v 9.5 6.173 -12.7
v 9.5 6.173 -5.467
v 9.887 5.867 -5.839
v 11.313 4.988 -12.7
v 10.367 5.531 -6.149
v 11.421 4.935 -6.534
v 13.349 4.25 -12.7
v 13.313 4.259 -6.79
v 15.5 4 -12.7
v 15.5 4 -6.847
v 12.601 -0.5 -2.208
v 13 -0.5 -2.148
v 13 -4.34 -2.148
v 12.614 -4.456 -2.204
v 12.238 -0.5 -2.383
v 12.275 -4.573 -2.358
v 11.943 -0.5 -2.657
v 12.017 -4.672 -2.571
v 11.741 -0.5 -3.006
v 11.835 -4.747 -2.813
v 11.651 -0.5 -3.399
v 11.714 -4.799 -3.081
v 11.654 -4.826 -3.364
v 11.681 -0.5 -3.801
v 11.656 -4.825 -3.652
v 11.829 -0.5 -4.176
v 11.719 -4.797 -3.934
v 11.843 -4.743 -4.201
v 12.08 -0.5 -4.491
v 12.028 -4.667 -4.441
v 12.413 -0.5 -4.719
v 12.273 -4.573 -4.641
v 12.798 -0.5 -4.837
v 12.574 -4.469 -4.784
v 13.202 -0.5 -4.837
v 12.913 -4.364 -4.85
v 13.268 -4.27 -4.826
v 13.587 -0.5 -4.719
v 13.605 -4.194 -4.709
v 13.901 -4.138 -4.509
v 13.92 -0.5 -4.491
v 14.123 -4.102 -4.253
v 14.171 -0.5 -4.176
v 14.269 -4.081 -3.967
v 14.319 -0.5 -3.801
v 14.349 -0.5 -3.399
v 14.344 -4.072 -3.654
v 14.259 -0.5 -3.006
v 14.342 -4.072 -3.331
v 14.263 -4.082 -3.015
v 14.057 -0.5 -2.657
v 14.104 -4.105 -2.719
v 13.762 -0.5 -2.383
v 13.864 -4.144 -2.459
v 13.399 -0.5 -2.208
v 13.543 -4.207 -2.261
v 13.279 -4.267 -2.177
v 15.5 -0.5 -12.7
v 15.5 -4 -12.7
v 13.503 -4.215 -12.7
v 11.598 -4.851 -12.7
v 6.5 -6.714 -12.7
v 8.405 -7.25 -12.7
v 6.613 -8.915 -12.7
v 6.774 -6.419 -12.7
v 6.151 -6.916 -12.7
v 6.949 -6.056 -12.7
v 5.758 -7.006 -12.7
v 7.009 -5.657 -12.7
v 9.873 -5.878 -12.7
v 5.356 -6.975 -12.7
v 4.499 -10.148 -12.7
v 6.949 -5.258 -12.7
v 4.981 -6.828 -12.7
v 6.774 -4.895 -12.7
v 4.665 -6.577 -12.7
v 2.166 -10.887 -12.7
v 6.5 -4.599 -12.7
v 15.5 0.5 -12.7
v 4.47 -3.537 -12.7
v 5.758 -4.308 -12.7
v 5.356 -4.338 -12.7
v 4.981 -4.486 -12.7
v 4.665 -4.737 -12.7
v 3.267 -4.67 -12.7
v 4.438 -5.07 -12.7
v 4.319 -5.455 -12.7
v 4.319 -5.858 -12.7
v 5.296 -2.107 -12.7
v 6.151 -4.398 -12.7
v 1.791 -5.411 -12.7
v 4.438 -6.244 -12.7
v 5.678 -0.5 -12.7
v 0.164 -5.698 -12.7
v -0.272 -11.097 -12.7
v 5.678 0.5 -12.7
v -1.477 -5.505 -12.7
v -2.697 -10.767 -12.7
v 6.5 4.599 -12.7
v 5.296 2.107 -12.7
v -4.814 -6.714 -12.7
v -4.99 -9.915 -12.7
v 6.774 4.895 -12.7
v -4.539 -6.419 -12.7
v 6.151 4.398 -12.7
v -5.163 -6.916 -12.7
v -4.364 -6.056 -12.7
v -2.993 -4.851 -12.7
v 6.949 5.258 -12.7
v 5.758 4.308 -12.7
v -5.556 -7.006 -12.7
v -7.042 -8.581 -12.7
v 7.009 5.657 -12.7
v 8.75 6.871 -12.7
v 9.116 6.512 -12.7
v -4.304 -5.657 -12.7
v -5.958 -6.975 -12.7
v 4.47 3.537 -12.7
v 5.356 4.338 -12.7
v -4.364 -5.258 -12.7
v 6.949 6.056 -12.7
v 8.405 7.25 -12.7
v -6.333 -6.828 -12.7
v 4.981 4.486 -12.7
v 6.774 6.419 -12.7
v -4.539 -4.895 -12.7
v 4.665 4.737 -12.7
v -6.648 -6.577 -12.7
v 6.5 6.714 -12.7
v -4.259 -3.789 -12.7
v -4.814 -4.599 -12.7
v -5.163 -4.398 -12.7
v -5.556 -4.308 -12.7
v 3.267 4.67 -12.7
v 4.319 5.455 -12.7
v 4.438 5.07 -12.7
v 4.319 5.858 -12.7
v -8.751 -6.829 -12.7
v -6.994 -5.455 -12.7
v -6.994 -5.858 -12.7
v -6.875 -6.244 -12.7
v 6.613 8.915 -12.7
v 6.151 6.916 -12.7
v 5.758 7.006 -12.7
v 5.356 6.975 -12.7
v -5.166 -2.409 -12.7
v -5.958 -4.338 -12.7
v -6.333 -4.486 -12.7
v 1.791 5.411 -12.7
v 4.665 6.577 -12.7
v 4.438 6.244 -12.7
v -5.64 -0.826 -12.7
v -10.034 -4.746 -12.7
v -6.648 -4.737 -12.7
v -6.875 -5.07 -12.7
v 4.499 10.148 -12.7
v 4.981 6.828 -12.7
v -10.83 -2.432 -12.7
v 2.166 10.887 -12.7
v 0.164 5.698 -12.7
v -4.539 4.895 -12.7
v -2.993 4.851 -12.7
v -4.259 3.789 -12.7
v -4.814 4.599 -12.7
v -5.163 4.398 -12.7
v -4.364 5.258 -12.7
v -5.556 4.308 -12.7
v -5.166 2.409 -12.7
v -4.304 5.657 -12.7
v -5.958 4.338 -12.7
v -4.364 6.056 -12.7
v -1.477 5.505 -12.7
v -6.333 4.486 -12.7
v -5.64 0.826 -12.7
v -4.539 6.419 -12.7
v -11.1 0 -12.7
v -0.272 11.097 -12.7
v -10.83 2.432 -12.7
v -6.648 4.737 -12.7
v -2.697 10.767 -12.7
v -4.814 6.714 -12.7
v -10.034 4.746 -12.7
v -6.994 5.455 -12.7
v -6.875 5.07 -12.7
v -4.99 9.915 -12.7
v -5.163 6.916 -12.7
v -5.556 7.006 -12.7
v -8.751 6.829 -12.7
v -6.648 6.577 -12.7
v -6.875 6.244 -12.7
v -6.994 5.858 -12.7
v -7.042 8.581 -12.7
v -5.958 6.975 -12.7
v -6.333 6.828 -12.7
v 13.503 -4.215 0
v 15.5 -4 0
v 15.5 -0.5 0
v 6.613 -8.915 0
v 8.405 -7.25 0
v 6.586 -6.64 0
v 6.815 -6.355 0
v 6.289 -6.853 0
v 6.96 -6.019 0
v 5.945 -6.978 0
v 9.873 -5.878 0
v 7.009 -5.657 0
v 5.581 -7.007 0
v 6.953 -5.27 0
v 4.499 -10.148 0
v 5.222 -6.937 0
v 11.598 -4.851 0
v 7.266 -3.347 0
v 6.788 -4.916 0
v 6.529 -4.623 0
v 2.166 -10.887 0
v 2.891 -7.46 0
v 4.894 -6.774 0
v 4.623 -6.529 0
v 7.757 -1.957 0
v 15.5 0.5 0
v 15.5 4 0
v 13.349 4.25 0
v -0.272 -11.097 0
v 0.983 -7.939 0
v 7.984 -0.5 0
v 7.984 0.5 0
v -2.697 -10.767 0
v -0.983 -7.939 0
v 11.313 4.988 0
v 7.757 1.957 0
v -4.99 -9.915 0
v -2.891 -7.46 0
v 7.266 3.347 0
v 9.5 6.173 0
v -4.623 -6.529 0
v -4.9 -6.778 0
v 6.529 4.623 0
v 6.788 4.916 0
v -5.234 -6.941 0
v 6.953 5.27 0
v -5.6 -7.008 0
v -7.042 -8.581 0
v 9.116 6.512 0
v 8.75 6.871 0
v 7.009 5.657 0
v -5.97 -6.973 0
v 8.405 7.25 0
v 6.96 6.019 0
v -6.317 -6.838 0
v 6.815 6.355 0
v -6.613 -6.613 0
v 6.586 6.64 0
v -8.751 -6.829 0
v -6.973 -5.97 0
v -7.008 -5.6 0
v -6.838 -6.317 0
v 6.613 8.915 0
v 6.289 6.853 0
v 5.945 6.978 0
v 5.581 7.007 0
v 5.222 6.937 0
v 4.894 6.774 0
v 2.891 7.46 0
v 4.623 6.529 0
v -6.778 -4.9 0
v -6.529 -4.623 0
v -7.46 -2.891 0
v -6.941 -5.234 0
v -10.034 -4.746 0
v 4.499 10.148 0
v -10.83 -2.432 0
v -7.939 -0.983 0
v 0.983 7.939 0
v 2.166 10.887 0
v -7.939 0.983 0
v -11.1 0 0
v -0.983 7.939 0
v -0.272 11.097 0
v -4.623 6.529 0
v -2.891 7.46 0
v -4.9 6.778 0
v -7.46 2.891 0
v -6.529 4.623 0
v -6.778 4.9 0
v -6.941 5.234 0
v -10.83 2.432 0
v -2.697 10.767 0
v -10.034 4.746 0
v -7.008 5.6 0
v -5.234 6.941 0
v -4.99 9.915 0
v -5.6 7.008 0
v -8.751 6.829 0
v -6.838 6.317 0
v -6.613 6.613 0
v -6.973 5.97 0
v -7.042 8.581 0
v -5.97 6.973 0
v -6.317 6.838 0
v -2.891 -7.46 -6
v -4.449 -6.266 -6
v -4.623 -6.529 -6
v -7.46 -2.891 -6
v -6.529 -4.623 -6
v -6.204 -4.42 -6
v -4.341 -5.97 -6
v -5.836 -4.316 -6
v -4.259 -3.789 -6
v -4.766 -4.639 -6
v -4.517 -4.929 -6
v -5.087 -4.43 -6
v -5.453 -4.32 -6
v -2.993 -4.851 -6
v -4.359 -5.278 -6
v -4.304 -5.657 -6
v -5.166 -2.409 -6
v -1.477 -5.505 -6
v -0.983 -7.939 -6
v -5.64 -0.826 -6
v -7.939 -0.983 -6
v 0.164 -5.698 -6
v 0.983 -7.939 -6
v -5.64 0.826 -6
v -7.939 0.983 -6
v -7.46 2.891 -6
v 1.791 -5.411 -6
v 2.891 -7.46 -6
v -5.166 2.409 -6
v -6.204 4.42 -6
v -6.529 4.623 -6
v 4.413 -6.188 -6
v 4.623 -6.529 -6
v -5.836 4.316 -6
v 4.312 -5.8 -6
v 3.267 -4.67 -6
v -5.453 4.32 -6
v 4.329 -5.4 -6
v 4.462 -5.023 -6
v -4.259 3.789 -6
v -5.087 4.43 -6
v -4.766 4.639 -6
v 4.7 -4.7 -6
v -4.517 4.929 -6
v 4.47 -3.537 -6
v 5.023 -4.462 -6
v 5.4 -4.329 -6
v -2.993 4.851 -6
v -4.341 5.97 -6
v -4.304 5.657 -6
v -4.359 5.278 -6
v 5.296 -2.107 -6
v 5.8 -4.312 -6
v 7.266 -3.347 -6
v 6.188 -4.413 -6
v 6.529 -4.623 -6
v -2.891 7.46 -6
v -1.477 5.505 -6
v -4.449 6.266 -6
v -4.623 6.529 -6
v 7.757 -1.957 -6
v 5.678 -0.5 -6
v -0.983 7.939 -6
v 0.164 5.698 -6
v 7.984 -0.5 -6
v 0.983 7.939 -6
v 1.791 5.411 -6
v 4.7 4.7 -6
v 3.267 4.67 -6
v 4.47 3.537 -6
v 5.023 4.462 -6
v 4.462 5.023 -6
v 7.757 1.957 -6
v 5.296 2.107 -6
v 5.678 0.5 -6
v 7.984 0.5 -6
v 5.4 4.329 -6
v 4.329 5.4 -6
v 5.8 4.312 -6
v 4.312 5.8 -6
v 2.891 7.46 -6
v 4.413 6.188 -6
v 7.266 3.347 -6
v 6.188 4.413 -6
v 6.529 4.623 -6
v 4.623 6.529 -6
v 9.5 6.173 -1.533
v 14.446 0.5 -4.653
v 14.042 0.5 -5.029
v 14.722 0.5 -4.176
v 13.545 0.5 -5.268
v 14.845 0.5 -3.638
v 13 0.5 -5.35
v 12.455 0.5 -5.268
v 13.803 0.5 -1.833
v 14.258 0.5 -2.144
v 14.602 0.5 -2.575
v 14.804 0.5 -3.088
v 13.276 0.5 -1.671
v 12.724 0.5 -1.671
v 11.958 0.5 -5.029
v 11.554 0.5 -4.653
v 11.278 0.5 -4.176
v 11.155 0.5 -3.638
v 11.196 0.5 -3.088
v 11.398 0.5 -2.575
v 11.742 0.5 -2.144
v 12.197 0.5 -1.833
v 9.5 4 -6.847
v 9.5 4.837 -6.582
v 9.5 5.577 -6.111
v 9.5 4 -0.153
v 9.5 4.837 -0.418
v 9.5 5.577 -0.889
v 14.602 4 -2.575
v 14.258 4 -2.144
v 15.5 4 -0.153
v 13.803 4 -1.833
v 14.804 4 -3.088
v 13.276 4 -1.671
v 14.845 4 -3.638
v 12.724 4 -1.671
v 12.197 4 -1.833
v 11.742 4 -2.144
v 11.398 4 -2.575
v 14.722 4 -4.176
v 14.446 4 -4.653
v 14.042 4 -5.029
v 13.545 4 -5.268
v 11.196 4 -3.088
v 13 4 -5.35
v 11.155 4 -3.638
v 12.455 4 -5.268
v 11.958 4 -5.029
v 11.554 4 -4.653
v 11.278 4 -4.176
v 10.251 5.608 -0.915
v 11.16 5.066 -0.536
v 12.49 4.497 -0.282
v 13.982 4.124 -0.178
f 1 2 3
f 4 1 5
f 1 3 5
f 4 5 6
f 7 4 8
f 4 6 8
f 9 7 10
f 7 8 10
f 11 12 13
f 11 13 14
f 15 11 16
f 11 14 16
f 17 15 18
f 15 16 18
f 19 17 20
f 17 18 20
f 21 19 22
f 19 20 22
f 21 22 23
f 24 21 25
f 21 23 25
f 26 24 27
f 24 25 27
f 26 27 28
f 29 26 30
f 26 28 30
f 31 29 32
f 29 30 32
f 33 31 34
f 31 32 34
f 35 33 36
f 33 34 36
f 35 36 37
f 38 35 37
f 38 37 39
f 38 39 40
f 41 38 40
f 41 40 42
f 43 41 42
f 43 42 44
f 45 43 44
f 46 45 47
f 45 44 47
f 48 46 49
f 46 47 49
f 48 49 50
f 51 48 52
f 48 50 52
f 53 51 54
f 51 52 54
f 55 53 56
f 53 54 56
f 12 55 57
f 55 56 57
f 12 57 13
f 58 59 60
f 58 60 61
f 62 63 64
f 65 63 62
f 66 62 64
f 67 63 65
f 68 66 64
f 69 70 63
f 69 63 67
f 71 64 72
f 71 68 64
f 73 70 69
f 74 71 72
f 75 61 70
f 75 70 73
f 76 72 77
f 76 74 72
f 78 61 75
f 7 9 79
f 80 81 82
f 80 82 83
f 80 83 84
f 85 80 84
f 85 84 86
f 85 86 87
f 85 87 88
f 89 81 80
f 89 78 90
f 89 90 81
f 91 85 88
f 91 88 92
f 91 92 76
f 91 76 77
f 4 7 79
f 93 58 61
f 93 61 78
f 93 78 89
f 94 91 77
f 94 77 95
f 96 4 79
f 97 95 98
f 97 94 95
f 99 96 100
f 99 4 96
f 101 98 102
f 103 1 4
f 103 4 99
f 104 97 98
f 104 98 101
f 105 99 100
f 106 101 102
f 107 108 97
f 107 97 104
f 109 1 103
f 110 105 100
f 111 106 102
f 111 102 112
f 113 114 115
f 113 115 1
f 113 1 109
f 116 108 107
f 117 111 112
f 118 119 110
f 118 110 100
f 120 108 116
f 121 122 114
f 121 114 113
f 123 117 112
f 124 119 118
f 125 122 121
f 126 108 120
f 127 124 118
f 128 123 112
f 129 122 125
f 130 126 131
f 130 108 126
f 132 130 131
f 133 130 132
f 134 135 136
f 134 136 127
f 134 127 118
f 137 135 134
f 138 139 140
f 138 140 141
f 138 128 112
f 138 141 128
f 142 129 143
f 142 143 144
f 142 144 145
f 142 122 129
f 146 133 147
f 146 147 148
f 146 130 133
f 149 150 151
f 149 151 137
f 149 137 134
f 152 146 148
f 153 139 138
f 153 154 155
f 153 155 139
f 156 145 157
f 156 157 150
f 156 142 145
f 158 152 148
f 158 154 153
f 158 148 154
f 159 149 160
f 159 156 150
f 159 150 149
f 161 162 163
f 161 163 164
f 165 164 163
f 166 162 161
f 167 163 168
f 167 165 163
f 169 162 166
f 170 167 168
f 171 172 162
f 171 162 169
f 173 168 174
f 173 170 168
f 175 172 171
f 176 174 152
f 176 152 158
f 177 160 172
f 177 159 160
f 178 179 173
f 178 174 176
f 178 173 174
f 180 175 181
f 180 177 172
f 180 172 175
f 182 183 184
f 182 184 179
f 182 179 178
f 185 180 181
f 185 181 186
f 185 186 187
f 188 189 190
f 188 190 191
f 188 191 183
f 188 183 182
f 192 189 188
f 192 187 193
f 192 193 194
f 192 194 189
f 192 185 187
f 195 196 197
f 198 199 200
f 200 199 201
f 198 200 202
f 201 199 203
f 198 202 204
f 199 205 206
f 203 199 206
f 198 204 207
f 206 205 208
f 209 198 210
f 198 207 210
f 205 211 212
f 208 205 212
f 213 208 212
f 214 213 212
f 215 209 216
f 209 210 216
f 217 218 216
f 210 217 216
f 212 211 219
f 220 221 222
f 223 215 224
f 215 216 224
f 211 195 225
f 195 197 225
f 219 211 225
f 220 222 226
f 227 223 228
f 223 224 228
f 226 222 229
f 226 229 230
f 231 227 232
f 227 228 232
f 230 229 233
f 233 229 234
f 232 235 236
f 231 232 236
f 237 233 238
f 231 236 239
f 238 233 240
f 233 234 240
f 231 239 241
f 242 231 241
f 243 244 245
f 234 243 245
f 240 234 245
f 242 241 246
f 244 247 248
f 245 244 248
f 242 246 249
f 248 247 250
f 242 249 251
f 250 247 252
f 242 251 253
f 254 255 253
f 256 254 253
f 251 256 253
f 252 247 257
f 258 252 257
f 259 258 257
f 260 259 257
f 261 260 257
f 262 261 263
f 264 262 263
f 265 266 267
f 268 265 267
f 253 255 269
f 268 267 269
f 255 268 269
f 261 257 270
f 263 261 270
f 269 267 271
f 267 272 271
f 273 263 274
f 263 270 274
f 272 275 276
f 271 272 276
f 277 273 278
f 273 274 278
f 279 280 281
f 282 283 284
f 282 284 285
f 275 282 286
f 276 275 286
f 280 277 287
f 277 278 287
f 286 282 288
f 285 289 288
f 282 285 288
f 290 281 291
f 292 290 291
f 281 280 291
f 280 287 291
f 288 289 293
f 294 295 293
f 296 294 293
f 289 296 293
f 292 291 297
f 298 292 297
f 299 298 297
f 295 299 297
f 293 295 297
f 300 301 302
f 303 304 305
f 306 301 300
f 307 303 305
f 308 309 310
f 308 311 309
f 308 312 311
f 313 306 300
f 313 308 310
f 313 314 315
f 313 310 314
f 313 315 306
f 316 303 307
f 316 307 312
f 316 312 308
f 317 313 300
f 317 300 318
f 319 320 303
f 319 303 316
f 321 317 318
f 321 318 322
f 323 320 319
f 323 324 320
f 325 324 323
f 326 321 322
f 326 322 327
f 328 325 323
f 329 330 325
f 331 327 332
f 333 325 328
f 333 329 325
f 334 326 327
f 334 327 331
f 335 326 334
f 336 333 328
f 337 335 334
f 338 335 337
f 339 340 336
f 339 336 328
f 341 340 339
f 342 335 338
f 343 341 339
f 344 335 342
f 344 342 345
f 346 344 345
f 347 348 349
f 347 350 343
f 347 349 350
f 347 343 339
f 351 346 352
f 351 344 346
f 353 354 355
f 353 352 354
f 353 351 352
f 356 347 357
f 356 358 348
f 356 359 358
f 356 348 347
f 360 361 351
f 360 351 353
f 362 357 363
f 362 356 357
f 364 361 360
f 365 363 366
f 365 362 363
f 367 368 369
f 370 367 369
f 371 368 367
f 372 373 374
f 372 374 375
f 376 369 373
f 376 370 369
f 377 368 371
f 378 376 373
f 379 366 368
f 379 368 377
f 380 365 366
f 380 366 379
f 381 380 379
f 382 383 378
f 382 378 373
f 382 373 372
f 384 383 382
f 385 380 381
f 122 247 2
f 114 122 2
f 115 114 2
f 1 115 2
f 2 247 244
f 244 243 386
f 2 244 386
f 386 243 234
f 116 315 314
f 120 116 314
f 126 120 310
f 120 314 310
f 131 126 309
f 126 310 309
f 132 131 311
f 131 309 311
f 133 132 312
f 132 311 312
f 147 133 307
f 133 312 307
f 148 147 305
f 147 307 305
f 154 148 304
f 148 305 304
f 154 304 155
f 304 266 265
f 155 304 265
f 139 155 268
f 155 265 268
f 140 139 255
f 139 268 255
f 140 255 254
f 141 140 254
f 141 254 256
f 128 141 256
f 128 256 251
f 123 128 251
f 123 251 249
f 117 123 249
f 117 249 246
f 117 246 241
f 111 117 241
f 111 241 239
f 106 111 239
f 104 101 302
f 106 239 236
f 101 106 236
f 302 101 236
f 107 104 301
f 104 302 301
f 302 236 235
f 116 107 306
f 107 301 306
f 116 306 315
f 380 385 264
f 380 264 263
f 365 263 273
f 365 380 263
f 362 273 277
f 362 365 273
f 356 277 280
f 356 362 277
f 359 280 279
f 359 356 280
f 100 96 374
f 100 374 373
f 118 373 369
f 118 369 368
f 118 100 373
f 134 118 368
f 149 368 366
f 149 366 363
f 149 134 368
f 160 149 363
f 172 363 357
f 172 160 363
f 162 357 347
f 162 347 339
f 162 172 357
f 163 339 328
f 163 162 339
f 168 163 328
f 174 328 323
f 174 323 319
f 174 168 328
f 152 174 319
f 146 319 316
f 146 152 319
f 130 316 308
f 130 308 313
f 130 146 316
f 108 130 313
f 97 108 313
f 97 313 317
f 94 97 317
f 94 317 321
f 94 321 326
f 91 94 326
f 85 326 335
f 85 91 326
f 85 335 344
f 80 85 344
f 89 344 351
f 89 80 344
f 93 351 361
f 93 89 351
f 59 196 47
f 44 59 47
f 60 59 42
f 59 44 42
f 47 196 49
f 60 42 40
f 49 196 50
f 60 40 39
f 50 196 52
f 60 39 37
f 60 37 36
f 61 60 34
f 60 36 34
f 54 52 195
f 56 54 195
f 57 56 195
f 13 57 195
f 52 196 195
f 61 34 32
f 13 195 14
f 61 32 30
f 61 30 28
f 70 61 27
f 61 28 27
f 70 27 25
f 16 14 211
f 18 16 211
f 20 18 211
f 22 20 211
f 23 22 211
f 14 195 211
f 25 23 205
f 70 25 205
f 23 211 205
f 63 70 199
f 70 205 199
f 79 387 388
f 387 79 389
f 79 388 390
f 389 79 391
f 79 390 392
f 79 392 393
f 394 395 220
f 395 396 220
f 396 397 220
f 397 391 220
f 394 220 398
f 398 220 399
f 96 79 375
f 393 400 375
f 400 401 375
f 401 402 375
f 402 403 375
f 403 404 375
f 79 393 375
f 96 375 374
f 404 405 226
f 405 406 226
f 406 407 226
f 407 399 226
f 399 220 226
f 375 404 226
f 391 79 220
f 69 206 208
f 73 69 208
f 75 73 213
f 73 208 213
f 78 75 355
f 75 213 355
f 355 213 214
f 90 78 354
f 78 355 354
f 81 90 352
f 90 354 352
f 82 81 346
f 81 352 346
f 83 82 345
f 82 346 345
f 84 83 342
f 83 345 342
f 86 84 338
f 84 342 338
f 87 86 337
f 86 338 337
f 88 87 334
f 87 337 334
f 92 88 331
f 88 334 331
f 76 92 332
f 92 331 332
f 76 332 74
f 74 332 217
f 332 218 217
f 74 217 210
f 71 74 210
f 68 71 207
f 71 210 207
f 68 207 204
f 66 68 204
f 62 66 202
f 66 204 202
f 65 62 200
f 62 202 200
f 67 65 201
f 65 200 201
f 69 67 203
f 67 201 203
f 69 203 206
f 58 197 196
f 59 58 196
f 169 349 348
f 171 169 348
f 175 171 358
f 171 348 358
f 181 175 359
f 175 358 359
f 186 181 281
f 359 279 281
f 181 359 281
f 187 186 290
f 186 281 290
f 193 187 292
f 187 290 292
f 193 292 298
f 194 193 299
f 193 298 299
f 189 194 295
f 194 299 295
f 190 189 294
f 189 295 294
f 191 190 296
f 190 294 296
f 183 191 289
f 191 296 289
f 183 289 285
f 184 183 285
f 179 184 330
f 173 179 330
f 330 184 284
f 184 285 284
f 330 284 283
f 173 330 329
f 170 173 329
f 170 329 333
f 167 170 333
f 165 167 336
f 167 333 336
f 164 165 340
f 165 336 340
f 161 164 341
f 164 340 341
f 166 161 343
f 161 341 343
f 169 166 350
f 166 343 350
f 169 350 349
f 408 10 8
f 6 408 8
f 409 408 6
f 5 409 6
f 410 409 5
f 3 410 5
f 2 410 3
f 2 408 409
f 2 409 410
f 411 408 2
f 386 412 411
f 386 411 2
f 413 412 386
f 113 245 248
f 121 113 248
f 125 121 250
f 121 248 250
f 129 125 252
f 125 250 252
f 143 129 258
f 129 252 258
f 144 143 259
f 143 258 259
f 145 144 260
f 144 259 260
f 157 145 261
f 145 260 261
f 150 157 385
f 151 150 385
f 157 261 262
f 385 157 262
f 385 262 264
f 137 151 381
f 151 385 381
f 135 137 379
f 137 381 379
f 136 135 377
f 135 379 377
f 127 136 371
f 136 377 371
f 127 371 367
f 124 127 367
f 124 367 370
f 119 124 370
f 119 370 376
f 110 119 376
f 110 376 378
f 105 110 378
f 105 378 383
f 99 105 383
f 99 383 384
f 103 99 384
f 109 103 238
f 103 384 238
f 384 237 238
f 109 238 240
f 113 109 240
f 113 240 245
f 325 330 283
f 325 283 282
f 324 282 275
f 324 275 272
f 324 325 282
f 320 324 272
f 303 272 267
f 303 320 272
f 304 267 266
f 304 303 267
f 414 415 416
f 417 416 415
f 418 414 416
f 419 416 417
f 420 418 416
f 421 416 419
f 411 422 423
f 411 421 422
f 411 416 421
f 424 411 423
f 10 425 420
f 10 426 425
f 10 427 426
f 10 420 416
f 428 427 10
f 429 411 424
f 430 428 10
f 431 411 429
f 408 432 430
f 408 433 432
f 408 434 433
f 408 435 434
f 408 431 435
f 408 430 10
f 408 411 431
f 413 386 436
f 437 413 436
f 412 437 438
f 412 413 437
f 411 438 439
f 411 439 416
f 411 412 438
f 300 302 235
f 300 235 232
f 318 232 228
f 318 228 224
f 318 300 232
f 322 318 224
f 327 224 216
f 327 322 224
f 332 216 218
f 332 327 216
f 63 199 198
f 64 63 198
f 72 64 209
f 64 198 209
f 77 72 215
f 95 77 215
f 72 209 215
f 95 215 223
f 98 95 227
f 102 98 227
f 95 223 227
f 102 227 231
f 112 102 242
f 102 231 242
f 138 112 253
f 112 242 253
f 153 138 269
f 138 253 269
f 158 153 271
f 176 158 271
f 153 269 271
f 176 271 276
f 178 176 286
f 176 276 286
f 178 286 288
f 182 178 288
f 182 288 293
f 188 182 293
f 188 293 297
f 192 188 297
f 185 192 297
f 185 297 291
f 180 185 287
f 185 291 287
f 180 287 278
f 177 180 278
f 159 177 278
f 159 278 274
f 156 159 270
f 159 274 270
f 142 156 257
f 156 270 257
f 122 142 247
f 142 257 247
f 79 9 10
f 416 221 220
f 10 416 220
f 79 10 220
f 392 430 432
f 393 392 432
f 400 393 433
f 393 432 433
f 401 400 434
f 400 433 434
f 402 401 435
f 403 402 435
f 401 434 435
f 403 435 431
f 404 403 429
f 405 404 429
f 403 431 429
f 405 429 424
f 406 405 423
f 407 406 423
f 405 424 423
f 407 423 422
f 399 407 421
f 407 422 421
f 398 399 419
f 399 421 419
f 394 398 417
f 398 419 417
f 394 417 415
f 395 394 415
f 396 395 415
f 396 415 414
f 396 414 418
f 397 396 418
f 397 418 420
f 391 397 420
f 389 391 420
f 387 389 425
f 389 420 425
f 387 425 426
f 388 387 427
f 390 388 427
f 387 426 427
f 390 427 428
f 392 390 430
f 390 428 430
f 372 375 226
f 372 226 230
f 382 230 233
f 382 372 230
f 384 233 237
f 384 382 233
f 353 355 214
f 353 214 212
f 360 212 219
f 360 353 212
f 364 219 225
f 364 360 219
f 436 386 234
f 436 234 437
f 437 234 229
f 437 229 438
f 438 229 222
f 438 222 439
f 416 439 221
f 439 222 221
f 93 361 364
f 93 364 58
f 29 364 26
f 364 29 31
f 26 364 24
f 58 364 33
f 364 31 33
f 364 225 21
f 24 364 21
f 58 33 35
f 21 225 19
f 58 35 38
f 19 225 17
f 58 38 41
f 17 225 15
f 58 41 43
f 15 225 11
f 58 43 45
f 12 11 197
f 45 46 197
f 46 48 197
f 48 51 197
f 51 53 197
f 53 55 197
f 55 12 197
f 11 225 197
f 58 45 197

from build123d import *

# Parameters (mm, degrees)
CUT_EXTRUDE1_START     = -12.7
CUT_EXTRUDE1_DEPTH     = 12.7
CUT_EXTRUDE1_START_2   = -7.233059634
CUT_EXTRUDE1_2_DEPTH   = 7.233059634
CUT_EXTRUDE1_3_DEPTH   = 6
CUT_EXTRUDE1_4_DEPTH   = 1.533059634
CUT_EXTRUDE1_START_3   = 9.5
CUT_EXTRUDE1_5_DEPTH   = 6.5
SKETCH3_W              = 1.3525
SKETCH3_H              = 10.6
M2_5_CLEARANCE_HOLE2_D = 2.705
SKETCH7_W              = 1.85
SKETCH7_H              = 10.6


with BuildPart() as part:
    # Cut-Extrude1: read off the stored shape, not the designer's step
    # Cut-Extrude1 outline → Cut-Extrude1 (new body)
    with BuildSketch(Plane(origin=(0, 0, -12.7), x_dir=(-1, 0, 0), z_dir=(0, 0, -1)).offset(CUT_EXTRUDE1_START)):
        with BuildLine():
            Line((-5.678027827, -0.5), (-15.5, -0.5))
            Line((-15.5, -0.5), (-15.5, -4))
            ThreePointArc((-15.5, -4), (-11.598248501, -4.851105882), (-8.405387738, -7.249790133))
            ThreePointArc((-8.405387738, -7.249790133), (11.1, 0), (-8.405387738, 7.249790133))
            ThreePointArc((-8.405387738, 7.249790133), (-8.930606577, 6.689081827), (-9.5, 6.173291403))
            Line((-9.5, 6.173291403), (-9.5, 4))
            Line((-9.5, 4), (-15.5, 4))
            Line((-15.5, 4), (-15.5, 0.5))
            Line((-15.5, 0.5), (-5.678027827, 0.5))
            ThreePointArc((-5.678027827, 0.5), (-5.7, 0), (-5.678027827, -0.5))
        make_face()
    extrude(amount=CUT_EXTRUDE1_DEPTH)

    # Cut-Extrude1 2 outline → Cut-Extrude1 2 (add)
    with BuildSketch(Plane(origin=(0, 0, -12.7), x_dir=(-1, 0, 0), z_dir=(0, 0, -1)).offset(CUT_EXTRUDE1_START_2)):
        with BuildLine():
            ThreePointArc((-9.5, 6.173291403), (-12.309263583, 4.560062613), (-15.5, 4))
            Line((-15.5, 4), (-9.5, 4))
            Line((-9.5, 4), (-9.5, 6.173291403))
        make_face()
    extrude(amount=CUT_EXTRUDE1_2_DEPTH)

    # Cut-Extrude1 3 outline → Cut-Extrude1 3 (add)
    with BuildSketch(Plane(origin=(0, 0, -12.7), x_dir=(-1, 0, 0), z_dir=(0, 0, -1)).offset(CUT_EXTRUDE1_START)):
        with BuildLine():
            ThreePointArc((-7.984359711, 0.5), (-8, 0), (-7.984359711, -0.5))
            Line((-7.984359711, -0.5), (-5.678027827, -0.5))
            ThreePointArc((-5.678027827, -0.5), (-5.7, 0), (-5.678027827, 0.5))
            Line((-5.678027827, 0.5), (-7.984359711, 0.5))
        make_face()
    extrude(amount=CUT_EXTRUDE1_3_DEPTH)

    # Cut-Extrude1 4 outline → Cut-Extrude1 4 (add)
    with BuildSketch(Plane(origin=(0, 0, -12.7), x_dir=(-1, 0, 0), z_dir=(0, 0, -1)).offset(CUT_EXTRUDE1_START)):
        with BuildLine():
            ThreePointArc((-9.5, 6.173291403), (-12.309263583, 4.560062613), (-15.5, 4))
            Line((-15.5, 4), (-9.5, 4))
            Line((-9.5, 4), (-9.5, 6.173291403))
        make_face()
    extrude(amount=CUT_EXTRUDE1_4_DEPTH)

    # Cut-Extrude1 5 outline → Cut-Extrude1 5 (cut)
    with BuildSketch(Plane.YZ.offset(CUT_EXTRUDE1_START_3)):
        with BuildLine():
            ThreePointArc((6.173291403, -1.533059534), (5.2222696, -0.629576076), (4, -0.153359894))
            Line((4, -0.153359894), (4, -1.533059634))
            Line((4, -1.533059634), (6.173291403, -1.533059534))
        make_face()
        with BuildLine():
            Line((6.173291403, -5.466940466), (4, -5.466940366))
            Line((4, -5.466940366), (4, -6.846640106))
            ThreePointArc((4, -6.846640106), (5.2222696, -6.370423924), (6.173291403, -5.466940466))
        make_face()
    extrude(amount=CUT_EXTRUDE1_5_DEPTH, mode=Mode.SUBTRACT)

    # Sketch2 → Cut-Revolve1 (revolve, cut)
    with BuildSketch(Plane(origin=(0, 0, 0), x_dir=(1, 0, 0), z_dir=(0, 1, 0))):
        Polygon((5.7, 12.7), (0, 12.7), (0, 0), (8, 0), (8, 6), (5.7, 6), align=None)
    revolve(axis=Axis((0, 0, -12.7), (0, 0, 1)), mode=Mode.SUBTRACT)

    # Sketch3 → M2.5 Clearance Hole1 (revolve, cut)
    with BuildSketch(Plane(origin=(13, -0.5, -3.5), x_dir=(0, 0, 1), z_dir=(1, 0, 0))):
        with Locations((0.67625, 5.3)):
            Rectangle(SKETCH3_W, SKETCH3_H)
    revolve(axis=Axis((13, 5.85, -3.5), (0, -1, 0)), mode=Mode.SUBTRACT)

    # M2.5 Clearance Hole2 (through all)
    with Locations(Plane(origin=(0, 0, -12.7), x_dir=(-1, 0, 0), z_dir=(0, 0, -1))):
        with Locations((-5.656854249, -5.656854249), (5.656854249, -5.656854249), (5.656854249, 5.656854249), (-5.656854249, 5.656854249)):
            Hole(M2_5_CLEARANCE_HOLE2_D / 2)

    # Sketch7 → Ø3.7 (3.7) Diameter Hole1 (revolve, cut)
    with BuildSketch(Plane(origin=(13, 0.5, -3.5), x_dir=(0, 0, -1), z_dir=(1, 0, 0))):
        with Locations((0.925, 5.3)):
            Rectangle(SKETCH7_W, SKETCH7_H)
    revolve(axis=Axis((13, -5.85, -3.5), (0, 1, 0)), mode=Mode.SUBTRACT)


solid = part.part
